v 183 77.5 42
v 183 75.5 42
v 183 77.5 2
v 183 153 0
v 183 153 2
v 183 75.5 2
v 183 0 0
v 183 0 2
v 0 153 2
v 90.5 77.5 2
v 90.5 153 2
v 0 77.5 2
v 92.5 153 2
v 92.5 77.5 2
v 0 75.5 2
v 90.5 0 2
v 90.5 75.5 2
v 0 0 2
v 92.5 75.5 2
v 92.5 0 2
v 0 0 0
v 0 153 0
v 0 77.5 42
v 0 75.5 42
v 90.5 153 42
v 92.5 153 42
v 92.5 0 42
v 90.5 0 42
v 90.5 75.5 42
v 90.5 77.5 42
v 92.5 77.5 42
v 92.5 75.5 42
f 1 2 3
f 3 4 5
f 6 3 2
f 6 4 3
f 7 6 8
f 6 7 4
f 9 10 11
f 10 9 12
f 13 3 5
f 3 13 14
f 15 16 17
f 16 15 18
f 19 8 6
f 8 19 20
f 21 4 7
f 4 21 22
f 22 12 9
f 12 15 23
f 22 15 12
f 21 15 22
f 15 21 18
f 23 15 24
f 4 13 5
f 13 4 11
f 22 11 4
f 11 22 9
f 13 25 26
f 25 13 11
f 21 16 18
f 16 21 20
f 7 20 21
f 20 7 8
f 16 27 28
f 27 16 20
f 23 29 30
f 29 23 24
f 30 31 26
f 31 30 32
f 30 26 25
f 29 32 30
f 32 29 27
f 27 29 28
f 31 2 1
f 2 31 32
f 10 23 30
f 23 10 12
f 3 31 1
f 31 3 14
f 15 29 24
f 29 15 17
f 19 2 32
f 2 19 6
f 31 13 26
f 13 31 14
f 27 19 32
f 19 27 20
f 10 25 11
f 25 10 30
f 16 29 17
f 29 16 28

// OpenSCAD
wall_thickness = 2;

inner_box_size = [183, 153, 42];

divider_length_offset = (inner_box_size[1] - wall_thickness) / 2;
divider_width_offset = (inner_box_size[0] - wall_thickness) / 2;

cube([inner_box_size[0], inner_box_size[1], wall_thickness]);

translate([0, divider_length_offset, 0]) {
  cube([inner_box_size[0], wall_thickness, inner_box_size[2]]);
} 

translate([divider_width_offset, 0, 0]) {
  cube([wall_thickness, inner_box_size[1], inner_box_size[2]]);
} 
